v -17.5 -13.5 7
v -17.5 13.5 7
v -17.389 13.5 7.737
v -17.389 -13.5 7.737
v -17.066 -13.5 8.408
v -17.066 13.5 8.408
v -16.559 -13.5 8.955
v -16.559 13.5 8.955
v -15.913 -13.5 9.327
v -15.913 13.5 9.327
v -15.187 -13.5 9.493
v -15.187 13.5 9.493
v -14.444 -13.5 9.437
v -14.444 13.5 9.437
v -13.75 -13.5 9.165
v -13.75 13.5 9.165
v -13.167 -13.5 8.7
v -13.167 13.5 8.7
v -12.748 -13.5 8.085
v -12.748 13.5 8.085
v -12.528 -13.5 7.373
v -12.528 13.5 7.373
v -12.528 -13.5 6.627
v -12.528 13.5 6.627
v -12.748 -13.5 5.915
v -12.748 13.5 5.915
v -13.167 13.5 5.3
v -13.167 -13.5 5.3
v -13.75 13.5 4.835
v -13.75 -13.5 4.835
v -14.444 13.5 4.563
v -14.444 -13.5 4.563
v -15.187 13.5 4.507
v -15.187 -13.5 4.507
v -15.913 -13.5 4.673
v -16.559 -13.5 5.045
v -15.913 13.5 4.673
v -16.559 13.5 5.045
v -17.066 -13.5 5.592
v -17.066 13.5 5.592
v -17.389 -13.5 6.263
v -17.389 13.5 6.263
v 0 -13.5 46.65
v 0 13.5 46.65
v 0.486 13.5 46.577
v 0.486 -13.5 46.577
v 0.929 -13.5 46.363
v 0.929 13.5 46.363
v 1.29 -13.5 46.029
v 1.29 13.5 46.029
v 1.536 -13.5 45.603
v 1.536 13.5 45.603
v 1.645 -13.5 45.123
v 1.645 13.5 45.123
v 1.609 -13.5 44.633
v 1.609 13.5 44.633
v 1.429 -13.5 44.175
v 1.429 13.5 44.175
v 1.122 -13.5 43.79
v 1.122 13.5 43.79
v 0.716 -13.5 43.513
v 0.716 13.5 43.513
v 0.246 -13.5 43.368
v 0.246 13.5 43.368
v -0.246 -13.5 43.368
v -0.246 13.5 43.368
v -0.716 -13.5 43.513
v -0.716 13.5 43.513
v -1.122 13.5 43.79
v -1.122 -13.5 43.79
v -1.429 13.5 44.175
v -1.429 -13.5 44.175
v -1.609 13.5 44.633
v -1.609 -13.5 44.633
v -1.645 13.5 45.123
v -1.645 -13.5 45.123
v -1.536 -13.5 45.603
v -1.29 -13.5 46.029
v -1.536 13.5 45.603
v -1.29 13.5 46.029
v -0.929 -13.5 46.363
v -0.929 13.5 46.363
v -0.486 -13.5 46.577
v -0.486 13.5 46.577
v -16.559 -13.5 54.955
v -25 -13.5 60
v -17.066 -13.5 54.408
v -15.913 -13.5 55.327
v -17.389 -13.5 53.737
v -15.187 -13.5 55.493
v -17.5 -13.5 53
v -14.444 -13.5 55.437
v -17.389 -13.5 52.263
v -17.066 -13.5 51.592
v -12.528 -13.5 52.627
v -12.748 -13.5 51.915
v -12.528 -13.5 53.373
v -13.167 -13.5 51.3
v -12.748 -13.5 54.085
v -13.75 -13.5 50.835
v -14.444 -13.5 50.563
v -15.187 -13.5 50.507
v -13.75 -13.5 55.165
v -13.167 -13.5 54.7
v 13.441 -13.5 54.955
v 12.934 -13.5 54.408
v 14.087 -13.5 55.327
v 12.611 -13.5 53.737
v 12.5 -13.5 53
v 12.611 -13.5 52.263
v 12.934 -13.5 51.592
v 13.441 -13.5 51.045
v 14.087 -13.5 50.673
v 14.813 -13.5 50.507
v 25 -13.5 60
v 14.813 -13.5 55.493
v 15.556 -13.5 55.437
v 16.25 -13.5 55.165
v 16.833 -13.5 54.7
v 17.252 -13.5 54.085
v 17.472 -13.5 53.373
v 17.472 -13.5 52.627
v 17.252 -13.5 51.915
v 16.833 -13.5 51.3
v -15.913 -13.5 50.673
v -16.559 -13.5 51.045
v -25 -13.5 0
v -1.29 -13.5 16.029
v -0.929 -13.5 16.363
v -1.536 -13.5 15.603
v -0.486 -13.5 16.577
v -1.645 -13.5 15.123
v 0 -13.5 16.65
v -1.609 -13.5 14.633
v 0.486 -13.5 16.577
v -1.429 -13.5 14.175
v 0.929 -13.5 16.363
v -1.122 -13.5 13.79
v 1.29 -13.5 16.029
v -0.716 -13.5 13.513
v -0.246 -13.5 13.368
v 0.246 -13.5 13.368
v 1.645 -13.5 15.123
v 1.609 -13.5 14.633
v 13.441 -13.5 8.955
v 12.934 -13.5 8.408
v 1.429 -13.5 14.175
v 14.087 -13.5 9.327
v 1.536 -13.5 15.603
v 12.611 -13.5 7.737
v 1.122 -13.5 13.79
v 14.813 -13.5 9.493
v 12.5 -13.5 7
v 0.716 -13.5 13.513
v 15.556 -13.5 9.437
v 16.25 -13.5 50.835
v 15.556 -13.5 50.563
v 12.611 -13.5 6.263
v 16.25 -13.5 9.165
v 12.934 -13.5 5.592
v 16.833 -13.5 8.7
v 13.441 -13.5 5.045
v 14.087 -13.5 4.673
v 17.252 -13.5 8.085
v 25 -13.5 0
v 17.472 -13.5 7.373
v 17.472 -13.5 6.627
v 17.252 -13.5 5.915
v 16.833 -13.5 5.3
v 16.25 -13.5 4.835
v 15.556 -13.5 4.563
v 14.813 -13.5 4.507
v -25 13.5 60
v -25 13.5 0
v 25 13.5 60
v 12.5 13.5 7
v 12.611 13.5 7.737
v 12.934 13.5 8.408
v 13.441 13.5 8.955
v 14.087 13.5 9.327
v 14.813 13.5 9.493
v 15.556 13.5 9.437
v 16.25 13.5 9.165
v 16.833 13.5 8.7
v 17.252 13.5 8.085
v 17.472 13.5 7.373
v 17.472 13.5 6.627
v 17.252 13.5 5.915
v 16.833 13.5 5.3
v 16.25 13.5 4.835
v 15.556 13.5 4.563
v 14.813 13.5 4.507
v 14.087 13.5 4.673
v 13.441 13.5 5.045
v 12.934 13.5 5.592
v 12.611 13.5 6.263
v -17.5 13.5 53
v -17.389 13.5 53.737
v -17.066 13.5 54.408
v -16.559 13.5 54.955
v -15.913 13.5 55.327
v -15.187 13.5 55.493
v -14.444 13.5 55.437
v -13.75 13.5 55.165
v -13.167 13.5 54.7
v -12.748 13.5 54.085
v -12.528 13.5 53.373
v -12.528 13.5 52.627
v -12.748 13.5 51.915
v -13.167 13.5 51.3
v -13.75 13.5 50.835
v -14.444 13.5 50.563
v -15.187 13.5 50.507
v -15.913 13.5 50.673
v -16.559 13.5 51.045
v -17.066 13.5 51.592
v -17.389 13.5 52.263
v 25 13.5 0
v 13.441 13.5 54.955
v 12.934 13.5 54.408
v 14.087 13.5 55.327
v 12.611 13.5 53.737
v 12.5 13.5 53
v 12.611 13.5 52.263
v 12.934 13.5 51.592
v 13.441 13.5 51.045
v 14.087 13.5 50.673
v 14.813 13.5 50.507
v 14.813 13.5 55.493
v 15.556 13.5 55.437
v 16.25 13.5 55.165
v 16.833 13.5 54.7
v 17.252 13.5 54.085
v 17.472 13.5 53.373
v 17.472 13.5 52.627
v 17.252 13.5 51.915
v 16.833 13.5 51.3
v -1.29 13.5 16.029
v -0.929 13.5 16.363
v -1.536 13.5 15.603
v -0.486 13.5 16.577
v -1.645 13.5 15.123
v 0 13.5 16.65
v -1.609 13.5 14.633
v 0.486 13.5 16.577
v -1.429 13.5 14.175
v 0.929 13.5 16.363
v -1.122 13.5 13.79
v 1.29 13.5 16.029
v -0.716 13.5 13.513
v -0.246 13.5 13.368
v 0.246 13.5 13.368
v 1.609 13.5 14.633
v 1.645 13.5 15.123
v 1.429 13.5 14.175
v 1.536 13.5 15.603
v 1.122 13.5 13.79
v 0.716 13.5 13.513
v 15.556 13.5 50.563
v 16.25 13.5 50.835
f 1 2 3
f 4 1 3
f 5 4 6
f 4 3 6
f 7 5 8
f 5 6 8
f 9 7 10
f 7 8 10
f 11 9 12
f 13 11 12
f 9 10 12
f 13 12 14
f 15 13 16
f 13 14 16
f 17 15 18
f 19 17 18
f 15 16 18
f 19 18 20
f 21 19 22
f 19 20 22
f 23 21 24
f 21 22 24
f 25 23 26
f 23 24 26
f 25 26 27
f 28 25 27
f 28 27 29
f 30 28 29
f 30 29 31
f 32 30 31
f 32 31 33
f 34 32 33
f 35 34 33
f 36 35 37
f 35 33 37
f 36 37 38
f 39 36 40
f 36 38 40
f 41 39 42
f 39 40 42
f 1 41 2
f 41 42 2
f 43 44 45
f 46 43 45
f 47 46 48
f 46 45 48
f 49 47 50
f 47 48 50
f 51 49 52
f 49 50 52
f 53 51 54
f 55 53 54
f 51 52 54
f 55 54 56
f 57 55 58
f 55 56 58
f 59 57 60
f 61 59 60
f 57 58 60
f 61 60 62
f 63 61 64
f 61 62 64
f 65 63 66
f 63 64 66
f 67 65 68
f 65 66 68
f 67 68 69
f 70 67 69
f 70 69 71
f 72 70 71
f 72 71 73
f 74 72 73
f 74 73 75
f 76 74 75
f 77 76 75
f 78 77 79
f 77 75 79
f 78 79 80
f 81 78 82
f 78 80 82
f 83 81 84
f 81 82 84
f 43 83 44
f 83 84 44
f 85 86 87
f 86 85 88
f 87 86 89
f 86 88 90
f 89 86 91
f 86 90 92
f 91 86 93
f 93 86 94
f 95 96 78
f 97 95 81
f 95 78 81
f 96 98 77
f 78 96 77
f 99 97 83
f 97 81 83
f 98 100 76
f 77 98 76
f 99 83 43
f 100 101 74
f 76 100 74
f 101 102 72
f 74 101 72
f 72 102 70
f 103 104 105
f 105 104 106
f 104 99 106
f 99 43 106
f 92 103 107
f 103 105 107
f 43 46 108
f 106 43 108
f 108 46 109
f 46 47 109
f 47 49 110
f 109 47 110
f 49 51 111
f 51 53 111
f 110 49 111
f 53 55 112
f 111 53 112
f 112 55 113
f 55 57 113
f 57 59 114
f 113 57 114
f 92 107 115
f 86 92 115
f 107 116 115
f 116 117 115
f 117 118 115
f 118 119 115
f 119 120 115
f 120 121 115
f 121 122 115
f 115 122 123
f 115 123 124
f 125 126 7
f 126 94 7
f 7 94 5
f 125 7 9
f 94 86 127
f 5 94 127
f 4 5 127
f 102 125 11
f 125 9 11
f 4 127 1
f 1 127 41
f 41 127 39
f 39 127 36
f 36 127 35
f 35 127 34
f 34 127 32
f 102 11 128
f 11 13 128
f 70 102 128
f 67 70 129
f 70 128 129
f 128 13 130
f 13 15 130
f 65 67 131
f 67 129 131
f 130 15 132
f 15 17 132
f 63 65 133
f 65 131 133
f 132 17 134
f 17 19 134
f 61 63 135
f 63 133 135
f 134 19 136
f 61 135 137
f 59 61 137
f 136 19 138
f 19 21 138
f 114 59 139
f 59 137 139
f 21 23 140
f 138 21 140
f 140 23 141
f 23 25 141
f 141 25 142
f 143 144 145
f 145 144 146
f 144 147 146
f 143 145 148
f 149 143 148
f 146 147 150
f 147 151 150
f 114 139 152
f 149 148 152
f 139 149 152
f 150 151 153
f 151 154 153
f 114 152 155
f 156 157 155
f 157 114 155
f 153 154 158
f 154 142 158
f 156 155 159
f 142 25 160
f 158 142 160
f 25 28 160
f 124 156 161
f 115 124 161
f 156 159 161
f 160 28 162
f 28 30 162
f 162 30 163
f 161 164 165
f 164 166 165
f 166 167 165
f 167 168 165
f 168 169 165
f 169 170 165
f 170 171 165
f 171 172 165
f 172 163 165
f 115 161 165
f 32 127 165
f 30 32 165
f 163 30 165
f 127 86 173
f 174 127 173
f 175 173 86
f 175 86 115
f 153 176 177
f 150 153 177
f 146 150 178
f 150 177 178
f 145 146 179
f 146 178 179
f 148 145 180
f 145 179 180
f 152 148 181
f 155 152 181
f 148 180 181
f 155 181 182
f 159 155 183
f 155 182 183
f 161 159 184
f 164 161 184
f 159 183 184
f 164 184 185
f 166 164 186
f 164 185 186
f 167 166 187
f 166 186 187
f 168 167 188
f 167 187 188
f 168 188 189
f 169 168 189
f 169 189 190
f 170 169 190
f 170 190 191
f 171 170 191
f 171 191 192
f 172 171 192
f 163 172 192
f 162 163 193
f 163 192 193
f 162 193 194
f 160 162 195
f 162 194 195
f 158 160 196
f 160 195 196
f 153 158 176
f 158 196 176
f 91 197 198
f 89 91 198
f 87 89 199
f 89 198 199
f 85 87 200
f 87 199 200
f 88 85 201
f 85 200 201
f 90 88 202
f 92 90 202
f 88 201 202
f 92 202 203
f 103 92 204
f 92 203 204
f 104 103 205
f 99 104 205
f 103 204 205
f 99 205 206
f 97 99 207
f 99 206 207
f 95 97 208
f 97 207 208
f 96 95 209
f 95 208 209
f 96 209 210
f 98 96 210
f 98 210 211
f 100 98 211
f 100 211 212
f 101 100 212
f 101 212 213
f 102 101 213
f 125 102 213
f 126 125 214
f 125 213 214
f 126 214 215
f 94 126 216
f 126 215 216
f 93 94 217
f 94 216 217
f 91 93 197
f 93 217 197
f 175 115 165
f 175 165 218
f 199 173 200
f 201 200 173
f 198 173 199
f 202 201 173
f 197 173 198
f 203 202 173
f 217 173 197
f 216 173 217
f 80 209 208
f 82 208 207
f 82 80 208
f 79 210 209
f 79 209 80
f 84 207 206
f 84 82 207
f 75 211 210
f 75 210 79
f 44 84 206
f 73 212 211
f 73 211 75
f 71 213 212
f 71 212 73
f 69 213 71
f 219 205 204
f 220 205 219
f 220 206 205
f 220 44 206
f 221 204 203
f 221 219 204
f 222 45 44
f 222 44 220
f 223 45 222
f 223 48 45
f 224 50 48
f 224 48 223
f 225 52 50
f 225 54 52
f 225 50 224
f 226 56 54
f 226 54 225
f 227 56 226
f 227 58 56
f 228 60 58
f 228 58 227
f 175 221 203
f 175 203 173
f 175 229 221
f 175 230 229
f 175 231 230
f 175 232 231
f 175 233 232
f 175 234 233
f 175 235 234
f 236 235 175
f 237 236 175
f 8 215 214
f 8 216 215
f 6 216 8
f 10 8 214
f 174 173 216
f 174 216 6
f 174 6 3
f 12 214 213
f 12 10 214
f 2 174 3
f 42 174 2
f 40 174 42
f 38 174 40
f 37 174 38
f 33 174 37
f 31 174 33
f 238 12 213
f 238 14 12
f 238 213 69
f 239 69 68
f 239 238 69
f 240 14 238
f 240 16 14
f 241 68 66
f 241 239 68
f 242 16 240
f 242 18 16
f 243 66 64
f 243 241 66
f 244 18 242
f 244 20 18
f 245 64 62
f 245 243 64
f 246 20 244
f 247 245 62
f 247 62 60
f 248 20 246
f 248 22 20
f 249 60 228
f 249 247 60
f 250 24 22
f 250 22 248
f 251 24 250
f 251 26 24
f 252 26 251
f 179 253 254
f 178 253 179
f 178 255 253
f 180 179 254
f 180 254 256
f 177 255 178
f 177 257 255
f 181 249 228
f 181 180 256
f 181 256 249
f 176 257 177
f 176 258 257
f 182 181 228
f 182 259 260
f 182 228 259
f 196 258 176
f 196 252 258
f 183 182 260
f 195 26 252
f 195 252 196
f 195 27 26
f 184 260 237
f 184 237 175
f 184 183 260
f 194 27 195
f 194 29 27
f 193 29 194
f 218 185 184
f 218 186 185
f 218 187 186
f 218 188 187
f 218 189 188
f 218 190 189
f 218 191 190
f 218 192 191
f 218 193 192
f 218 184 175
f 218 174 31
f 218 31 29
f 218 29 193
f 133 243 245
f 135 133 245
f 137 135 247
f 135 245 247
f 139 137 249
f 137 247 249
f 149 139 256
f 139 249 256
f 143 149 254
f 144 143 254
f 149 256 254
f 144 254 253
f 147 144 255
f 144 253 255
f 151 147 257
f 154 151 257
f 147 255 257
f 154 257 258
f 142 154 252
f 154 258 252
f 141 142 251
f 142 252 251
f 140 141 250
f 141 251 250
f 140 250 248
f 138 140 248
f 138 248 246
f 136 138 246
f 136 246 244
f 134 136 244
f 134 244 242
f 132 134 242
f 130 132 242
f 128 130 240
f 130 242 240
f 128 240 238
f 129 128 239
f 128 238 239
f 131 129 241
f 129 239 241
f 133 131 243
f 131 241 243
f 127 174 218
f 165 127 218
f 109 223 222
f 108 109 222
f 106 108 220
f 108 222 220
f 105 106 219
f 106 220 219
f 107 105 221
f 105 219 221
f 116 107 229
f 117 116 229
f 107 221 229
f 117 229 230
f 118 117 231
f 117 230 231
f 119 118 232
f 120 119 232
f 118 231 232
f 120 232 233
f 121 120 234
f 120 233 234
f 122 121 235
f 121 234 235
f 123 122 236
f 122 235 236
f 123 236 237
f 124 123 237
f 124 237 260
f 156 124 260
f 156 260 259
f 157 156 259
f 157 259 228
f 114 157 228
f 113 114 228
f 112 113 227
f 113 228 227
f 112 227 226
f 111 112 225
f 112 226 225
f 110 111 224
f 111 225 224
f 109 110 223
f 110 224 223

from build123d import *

# Parameters (mm, degrees)
SKETCH_1_W             = 50
SKETCH_1_H             = 27
EXTRUDE_1_DEPTH        = 60
SKETCH_2_R             = 2.5
CUT_EXTRUDE_1_DEPTH    = 27
PATTERN_LINEAR_1_COUNT = 2
PATTERN_LINEAR_1_PITCH = 46
SKETCH_3_R             = 2.5
CUT_EXTRUDE_2_DEPTH    = 27
PATTERN_LINEAR_2_COUNT = 2
PATTERN_LINEAR_2_PITCH = 46
SKETCH_4_R             = 1.65
CUT_EXTRUDE_3_DEPTH    = 27


with BuildPart() as part:
    # Эскиз1 → Бобышка-Вытянуть1 (new body)
    with BuildSketch(Plane.XY):
        Rectangle(SKETCH_1_W, SKETCH_1_H)
    extrude(amount=EXTRUDE_1_DEPTH)

    # Эскиз2 → Вырез-Вытянуть1 (cut)
    with BuildSketch(Plane(origin=(0, 13.5, 0), x_dir=(1, 0, 0), z_dir=(0, 1, 0))):
        with Locations(Location((-15, -7, 0), (0, 0, 180))):
            Circle(SKETCH_2_R)
    cut_extrude_1 = extrude(amount=-CUT_EXTRUDE_1_DEPTH, mode=Mode.SUBTRACT)

    # Линейный массив1: Вырез-Вытянуть1 ×2
    with Locations(*[(0, 0, i * PATTERN_LINEAR_1_PITCH) for i in range(1, PATTERN_LINEAR_1_COUNT)]):
        add(cut_extrude_1, mode=Mode.SUBTRACT)

    # Эскиз3 → Вырез-Вытянуть2 (cut)
    with BuildSketch(Plane(origin=(0, 13.5, 0), x_dir=(1, 0, 0), z_dir=(0, 1, 0))):
        with Locations(Location((15, -7, 0), (0, 0, 180))):
            Circle(SKETCH_3_R)
    cut_extrude_2 = extrude(amount=-CUT_EXTRUDE_2_DEPTH, mode=Mode.SUBTRACT)

    # Линейный массив2: Вырез-Вытянуть2 ×2
    with Locations(*[(0, 0, i * PATTERN_LINEAR_2_PITCH) for i in range(1, PATTERN_LINEAR_2_COUNT)]):
        add(cut_extrude_2, mode=Mode.SUBTRACT)

    # Эскиз4 → Вырез-Вытянуть3 (cut)
    with BuildSketch(Plane(origin=(0, 13.5, 0), x_dir=(1, 0, 0), z_dir=(0, 1, 0))):
        with Locations(Location((0, -15, 0), (0, 0, 270))):
            Circle(SKETCH_4_R)
        with Locations(Location((0, -45, 0), (0, 0, 270))):
            Circle(SKETCH_4_R)
    extrude(amount=-CUT_EXTRUDE_3_DEPTH, mode=Mode.SUBTRACT)


solid = part.part
